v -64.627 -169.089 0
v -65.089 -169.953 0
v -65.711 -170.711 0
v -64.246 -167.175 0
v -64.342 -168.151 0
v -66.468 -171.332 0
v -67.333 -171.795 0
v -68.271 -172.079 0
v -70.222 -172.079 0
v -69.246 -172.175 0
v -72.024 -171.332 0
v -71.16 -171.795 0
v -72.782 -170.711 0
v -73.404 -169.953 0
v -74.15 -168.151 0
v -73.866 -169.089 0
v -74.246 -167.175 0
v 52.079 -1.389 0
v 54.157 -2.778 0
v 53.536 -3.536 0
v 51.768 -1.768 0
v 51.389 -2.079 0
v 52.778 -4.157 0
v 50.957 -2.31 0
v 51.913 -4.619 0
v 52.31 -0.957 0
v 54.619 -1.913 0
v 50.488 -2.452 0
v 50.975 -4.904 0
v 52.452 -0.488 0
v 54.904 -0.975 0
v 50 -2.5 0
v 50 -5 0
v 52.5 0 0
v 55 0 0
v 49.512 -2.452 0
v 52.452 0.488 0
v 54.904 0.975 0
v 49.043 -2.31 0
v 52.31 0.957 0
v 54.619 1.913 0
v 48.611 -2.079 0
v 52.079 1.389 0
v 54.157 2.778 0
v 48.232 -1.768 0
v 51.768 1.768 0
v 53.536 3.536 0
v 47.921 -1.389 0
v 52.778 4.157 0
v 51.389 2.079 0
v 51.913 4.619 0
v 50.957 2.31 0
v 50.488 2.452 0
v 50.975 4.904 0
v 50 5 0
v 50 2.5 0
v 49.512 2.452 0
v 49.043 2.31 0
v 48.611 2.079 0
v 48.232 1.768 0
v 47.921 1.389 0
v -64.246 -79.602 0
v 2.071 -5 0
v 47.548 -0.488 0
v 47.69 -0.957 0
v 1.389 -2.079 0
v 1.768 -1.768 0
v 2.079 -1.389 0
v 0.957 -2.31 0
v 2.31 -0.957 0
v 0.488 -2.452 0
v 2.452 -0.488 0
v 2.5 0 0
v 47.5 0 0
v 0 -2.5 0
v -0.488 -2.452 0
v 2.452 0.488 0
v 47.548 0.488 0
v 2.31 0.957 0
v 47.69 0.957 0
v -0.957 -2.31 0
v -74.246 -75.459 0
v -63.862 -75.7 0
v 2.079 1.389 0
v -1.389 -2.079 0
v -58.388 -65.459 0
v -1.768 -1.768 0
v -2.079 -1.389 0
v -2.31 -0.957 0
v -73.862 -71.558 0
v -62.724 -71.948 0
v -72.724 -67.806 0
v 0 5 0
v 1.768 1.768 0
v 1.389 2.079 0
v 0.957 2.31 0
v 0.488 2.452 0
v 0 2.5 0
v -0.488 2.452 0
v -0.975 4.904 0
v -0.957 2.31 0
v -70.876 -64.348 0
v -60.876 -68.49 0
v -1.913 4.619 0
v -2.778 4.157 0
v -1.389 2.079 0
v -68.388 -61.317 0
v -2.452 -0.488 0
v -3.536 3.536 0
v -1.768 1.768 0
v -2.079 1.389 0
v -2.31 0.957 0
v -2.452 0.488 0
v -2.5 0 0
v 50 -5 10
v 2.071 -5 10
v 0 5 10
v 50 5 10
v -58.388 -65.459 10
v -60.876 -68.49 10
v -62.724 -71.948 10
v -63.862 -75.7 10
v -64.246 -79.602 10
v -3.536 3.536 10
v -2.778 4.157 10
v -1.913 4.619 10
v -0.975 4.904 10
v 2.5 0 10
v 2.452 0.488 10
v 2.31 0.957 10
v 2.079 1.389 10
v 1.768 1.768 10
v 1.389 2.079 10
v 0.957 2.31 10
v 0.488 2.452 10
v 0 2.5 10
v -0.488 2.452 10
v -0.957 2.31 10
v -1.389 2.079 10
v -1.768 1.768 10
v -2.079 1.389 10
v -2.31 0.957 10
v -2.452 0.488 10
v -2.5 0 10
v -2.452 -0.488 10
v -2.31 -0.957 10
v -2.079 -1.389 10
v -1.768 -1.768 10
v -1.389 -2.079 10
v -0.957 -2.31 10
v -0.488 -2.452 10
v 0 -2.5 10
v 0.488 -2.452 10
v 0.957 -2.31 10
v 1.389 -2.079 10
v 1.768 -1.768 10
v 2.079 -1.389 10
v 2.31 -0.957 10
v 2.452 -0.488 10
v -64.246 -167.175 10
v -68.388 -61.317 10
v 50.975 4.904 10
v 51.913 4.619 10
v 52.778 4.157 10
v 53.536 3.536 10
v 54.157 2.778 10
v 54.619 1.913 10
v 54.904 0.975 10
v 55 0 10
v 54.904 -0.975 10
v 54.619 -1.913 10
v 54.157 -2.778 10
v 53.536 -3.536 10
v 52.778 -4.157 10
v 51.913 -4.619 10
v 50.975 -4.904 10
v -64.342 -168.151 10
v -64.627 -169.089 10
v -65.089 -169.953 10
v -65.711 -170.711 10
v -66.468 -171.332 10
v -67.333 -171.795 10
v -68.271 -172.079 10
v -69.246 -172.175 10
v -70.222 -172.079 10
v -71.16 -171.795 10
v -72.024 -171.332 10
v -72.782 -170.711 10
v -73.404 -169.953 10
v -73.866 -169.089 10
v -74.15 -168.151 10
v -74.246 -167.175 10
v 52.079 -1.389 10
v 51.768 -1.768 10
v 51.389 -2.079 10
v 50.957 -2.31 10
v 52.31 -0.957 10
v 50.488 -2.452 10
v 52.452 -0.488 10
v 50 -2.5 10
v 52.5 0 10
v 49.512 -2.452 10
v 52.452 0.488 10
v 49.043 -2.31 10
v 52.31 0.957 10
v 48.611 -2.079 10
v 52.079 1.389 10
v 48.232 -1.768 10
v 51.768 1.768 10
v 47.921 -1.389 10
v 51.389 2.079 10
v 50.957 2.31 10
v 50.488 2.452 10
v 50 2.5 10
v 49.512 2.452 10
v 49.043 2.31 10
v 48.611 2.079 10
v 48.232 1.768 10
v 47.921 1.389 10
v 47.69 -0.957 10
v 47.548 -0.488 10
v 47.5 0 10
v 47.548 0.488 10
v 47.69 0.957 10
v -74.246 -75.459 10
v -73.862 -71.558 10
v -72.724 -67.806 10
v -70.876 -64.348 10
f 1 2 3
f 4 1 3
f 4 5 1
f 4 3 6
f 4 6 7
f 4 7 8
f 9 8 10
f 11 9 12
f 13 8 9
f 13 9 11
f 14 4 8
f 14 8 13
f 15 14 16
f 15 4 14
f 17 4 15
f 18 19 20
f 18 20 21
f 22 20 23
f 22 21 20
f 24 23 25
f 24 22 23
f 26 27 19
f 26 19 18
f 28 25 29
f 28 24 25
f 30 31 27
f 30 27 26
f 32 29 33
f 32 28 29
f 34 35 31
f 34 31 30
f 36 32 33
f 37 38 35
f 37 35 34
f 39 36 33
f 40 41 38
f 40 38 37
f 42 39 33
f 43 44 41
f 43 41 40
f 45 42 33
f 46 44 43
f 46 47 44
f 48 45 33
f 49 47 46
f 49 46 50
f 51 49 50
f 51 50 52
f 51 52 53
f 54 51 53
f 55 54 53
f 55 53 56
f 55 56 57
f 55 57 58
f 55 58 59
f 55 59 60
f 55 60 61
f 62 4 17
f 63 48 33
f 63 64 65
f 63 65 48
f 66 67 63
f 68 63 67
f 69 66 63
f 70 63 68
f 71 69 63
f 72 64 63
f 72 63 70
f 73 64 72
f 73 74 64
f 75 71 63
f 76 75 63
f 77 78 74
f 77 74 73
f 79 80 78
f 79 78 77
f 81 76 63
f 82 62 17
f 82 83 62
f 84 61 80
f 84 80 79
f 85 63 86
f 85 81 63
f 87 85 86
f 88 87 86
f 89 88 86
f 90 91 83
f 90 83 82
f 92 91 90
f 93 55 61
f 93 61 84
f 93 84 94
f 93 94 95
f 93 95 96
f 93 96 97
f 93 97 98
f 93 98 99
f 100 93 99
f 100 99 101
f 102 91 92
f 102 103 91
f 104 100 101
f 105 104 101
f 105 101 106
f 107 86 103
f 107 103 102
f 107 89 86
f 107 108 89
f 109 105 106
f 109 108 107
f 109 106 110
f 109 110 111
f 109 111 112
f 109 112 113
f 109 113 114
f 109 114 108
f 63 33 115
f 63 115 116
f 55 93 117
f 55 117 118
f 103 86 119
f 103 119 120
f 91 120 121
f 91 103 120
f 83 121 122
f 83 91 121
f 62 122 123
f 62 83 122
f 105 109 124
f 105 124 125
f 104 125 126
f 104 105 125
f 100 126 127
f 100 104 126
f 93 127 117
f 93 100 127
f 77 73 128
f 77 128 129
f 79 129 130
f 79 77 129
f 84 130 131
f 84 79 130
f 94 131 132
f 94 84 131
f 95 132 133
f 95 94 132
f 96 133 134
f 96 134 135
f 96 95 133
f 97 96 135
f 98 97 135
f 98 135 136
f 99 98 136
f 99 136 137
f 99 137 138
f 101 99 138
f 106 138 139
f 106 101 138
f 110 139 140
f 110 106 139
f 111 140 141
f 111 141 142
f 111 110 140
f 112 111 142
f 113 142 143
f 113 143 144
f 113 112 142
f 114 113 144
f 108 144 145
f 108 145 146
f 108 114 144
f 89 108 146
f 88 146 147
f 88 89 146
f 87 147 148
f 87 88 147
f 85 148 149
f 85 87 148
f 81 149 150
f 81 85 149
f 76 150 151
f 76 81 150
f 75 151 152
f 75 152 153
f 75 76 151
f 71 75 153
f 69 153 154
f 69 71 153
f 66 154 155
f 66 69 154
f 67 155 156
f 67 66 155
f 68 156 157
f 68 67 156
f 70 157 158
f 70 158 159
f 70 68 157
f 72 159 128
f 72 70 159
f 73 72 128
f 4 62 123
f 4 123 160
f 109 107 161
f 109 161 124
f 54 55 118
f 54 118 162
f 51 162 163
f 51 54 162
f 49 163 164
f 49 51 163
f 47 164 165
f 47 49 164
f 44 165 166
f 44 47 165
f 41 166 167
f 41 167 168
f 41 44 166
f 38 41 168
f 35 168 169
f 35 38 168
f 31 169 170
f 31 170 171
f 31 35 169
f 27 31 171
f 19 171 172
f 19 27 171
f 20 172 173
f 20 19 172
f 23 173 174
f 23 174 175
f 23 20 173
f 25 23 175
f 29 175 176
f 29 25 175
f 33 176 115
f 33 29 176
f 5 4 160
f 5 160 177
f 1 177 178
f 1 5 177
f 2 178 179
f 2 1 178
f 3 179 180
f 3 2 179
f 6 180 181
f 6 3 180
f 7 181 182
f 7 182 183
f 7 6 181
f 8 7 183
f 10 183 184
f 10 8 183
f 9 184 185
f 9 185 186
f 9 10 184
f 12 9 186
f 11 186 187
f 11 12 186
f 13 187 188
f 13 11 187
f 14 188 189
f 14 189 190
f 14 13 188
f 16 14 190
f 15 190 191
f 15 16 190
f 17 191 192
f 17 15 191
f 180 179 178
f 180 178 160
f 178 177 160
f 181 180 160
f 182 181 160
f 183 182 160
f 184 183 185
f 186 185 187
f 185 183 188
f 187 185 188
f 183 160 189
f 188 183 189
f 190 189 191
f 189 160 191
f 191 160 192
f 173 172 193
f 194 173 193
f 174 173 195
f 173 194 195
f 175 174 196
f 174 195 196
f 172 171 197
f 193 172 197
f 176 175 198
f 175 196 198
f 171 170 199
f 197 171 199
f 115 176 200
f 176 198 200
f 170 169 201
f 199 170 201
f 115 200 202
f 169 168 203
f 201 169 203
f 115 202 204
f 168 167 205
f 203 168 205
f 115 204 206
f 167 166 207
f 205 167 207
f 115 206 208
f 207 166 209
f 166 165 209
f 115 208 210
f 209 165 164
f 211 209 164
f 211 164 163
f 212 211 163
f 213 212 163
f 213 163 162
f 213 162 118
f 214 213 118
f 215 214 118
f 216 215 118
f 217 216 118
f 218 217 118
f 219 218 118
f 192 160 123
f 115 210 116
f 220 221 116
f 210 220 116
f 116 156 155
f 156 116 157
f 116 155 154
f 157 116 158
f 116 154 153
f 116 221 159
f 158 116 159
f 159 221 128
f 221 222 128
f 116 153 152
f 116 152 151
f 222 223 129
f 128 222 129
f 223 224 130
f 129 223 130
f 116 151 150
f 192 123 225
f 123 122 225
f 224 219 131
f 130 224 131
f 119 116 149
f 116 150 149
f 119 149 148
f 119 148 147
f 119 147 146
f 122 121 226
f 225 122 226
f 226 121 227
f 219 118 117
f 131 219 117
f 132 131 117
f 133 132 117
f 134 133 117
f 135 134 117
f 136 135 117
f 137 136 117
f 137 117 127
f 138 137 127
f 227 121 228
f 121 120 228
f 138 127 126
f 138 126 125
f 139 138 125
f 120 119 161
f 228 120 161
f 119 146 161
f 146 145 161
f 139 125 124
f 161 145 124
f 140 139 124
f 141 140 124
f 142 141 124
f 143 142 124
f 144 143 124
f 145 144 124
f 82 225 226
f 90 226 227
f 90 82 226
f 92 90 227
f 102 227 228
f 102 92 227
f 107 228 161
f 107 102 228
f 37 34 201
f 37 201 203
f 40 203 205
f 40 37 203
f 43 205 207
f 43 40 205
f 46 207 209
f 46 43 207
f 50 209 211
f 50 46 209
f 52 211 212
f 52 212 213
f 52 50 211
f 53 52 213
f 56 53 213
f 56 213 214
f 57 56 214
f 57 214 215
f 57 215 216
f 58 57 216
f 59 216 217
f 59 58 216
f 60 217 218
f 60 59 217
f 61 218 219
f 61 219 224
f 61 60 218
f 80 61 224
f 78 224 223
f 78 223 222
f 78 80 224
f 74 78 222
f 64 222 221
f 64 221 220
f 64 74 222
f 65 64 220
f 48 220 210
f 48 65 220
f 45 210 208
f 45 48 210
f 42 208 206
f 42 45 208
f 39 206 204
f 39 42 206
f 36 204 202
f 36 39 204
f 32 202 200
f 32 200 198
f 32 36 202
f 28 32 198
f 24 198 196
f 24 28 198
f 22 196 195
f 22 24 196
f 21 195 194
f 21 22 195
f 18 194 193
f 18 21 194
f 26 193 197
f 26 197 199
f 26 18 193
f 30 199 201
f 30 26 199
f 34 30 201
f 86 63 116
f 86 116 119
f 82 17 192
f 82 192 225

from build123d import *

# Parameters (mm, degrees)
SKETCH3_R           = 2.5
BOSS_EXTRUDE1_DEPTH = 10


with BuildPart() as part:
    # Sketch3 → Boss-Extrude1 (new body)
    with BuildSketch(Plane.XY):
        with BuildLine():
            Line((0, 5), (50, 5))
            ThreePointArc((50, 5), (55, 0), (50, -5))
            Line((50, -5), (2.071067812, -5))
            Line((2.071067812, -5), (-58.388347648, -65.45941546))
            ThreePointArc((-58.388347648, -65.45941546), (-62.723802675, -71.947882437), (-64.246212025, -79.601551084))
            Line((-64.246212025, -79.601551084), (-64.246212025, -167.175144213))
            ThreePointArc((-64.246212025, -167.175144213), (-69.246212025, -172.175144213), (-74.246212025, -167.175144213))
            Line((-74.246212025, -167.175144213), (-74.246212025, -75.45941546))
            ThreePointArc((-74.246212025, -75.45941546), (-72.723802675, -67.805746813), (-68.388347648, -61.317279836))
            Line((-68.388347648, -61.317279836), (-3.535533906, 3.535533906))
            ThreePointArc((-3.535533906, 3.535533906), (-1.913417162, 4.619397663), (0, 5))
        make_face()
        Circle(SKETCH3_R, mode=Mode.SUBTRACT)
        with Locations((50, 0)):
            Circle(SKETCH3_R, mode=Mode.SUBTRACT)
    extrude(amount=BOSS_EXTRUDE1_DEPTH)


solid = part.part
